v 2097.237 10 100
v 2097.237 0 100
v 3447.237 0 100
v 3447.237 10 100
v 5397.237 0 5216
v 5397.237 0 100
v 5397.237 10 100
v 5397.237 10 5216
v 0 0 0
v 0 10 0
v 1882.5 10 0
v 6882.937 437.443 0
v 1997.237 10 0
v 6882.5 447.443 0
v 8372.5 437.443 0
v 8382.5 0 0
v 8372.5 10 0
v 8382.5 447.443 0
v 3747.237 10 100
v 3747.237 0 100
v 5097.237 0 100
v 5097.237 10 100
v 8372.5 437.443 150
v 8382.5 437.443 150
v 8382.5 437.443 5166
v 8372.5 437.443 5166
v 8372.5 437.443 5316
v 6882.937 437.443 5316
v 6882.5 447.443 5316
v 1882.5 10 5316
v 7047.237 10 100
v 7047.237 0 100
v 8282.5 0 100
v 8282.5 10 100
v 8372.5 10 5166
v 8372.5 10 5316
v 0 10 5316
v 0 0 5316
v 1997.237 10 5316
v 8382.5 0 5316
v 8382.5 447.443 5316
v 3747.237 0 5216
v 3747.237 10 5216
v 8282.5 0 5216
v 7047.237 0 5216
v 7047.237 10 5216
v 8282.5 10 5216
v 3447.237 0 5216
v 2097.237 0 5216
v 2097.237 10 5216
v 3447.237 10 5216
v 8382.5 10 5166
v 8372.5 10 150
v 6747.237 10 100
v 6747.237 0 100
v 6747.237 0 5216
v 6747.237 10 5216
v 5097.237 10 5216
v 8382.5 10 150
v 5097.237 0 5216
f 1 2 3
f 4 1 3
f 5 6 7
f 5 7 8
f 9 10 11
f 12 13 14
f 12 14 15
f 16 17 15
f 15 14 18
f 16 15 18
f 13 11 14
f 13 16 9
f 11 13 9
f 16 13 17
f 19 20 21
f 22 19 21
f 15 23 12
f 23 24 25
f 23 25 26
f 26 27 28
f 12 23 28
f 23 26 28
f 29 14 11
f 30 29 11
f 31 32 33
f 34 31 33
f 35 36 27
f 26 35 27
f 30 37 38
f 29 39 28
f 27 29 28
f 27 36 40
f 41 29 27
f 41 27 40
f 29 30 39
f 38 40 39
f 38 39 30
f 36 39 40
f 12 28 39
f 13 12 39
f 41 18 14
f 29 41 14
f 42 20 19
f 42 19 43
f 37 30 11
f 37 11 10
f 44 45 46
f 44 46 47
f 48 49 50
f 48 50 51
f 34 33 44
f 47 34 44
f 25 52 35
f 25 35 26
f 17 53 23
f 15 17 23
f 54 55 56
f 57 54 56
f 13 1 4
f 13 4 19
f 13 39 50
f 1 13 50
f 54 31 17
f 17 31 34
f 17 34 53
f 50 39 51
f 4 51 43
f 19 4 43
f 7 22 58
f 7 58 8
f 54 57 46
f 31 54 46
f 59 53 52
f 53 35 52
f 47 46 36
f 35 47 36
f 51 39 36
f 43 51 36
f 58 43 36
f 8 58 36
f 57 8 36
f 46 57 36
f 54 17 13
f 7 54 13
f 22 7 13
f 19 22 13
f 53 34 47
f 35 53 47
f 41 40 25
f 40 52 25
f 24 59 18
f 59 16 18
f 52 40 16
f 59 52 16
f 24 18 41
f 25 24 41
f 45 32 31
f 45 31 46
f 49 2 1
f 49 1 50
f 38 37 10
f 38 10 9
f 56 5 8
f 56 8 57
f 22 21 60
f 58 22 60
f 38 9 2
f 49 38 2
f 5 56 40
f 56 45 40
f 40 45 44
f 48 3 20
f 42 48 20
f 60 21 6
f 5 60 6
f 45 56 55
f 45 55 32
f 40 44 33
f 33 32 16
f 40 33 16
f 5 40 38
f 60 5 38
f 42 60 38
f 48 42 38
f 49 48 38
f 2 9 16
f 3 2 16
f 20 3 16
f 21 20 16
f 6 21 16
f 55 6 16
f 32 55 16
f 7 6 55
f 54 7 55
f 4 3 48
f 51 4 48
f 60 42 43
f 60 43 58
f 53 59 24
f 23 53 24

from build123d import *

# Parameters (mm, degrees)
BOSS_EXTRUDE1_DEPTH = 5316
CUT_EXTRUDE1_DEPTH  = 9937.114319617
SKETCH3_W           = 1350
SKETCH3_H           = 5116
SKETCH3_W_2         = 1235.262867543
CUT_EXTRUDE2_DEPTH  = 10
SKETCH5_W           = 5016
SKETCH5_H           = 427.44331763
CUT_EXTRUDE4_DEPTH  = 100


with BuildPart() as part:
    # Sketch1 → Boss-Extrude1 (new body)
    with BuildSketch(Plane.XY):
        Polygon((6882.5, 447.44331763), (1882.5, 10), (0, 10), (0, 0), (8382.5, 0), (8382.5, 447.44331763), align=None)
    extrude(amount=BOSS_EXTRUDE1_DEPTH)

    # Sketch2 → Cut-Extrude1 (cut, through all)
    with BuildSketch(Plane.XY.offset(5316)):
        Polygon((8372.5, 10), (8372.5, 437.44331763), (6882.936609429, 437.44331763), (1997.237132457, 10), align=None)
    extrude(amount=-CUT_EXTRUDE1_DEPTH, mode=Mode.SUBTRACT)

    # Sketch3 → Cut-Extrude2 (cut)
    with BuildSketch(Plane.XZ):
        with Locations((4422.237132457, 2658)):
            Rectangle(SKETCH3_W, SKETCH3_H)
        with Locations((6072.237132457, 2658)):
            Rectangle(SKETCH3_W, SKETCH3_H)
        with Locations((2772.237132457, 2658)):
            Rectangle(SKETCH3_W, SKETCH3_H)
        with Locations((7664.868566229, 2658)):
            Rectangle(SKETCH3_W_2, SKETCH3_H)
    extrude(amount=-CUT_EXTRUDE2_DEPTH, mode=Mode.SUBTRACT)

    # Sketch5 → Cut-Extrude4 (cut)
    with BuildSketch(Plane(origin=(8382.5, 0, 0), x_dir=(0, 0, -1), z_dir=(1, 0, 0))):
        with Locations((-2658, 223.721658815)):
            Rectangle(SKETCH5_W, SKETCH5_H)
    extrude(amount=-CUT_EXTRUDE4_DEPTH, mode=Mode.SUBTRACT)


solid = part.part
